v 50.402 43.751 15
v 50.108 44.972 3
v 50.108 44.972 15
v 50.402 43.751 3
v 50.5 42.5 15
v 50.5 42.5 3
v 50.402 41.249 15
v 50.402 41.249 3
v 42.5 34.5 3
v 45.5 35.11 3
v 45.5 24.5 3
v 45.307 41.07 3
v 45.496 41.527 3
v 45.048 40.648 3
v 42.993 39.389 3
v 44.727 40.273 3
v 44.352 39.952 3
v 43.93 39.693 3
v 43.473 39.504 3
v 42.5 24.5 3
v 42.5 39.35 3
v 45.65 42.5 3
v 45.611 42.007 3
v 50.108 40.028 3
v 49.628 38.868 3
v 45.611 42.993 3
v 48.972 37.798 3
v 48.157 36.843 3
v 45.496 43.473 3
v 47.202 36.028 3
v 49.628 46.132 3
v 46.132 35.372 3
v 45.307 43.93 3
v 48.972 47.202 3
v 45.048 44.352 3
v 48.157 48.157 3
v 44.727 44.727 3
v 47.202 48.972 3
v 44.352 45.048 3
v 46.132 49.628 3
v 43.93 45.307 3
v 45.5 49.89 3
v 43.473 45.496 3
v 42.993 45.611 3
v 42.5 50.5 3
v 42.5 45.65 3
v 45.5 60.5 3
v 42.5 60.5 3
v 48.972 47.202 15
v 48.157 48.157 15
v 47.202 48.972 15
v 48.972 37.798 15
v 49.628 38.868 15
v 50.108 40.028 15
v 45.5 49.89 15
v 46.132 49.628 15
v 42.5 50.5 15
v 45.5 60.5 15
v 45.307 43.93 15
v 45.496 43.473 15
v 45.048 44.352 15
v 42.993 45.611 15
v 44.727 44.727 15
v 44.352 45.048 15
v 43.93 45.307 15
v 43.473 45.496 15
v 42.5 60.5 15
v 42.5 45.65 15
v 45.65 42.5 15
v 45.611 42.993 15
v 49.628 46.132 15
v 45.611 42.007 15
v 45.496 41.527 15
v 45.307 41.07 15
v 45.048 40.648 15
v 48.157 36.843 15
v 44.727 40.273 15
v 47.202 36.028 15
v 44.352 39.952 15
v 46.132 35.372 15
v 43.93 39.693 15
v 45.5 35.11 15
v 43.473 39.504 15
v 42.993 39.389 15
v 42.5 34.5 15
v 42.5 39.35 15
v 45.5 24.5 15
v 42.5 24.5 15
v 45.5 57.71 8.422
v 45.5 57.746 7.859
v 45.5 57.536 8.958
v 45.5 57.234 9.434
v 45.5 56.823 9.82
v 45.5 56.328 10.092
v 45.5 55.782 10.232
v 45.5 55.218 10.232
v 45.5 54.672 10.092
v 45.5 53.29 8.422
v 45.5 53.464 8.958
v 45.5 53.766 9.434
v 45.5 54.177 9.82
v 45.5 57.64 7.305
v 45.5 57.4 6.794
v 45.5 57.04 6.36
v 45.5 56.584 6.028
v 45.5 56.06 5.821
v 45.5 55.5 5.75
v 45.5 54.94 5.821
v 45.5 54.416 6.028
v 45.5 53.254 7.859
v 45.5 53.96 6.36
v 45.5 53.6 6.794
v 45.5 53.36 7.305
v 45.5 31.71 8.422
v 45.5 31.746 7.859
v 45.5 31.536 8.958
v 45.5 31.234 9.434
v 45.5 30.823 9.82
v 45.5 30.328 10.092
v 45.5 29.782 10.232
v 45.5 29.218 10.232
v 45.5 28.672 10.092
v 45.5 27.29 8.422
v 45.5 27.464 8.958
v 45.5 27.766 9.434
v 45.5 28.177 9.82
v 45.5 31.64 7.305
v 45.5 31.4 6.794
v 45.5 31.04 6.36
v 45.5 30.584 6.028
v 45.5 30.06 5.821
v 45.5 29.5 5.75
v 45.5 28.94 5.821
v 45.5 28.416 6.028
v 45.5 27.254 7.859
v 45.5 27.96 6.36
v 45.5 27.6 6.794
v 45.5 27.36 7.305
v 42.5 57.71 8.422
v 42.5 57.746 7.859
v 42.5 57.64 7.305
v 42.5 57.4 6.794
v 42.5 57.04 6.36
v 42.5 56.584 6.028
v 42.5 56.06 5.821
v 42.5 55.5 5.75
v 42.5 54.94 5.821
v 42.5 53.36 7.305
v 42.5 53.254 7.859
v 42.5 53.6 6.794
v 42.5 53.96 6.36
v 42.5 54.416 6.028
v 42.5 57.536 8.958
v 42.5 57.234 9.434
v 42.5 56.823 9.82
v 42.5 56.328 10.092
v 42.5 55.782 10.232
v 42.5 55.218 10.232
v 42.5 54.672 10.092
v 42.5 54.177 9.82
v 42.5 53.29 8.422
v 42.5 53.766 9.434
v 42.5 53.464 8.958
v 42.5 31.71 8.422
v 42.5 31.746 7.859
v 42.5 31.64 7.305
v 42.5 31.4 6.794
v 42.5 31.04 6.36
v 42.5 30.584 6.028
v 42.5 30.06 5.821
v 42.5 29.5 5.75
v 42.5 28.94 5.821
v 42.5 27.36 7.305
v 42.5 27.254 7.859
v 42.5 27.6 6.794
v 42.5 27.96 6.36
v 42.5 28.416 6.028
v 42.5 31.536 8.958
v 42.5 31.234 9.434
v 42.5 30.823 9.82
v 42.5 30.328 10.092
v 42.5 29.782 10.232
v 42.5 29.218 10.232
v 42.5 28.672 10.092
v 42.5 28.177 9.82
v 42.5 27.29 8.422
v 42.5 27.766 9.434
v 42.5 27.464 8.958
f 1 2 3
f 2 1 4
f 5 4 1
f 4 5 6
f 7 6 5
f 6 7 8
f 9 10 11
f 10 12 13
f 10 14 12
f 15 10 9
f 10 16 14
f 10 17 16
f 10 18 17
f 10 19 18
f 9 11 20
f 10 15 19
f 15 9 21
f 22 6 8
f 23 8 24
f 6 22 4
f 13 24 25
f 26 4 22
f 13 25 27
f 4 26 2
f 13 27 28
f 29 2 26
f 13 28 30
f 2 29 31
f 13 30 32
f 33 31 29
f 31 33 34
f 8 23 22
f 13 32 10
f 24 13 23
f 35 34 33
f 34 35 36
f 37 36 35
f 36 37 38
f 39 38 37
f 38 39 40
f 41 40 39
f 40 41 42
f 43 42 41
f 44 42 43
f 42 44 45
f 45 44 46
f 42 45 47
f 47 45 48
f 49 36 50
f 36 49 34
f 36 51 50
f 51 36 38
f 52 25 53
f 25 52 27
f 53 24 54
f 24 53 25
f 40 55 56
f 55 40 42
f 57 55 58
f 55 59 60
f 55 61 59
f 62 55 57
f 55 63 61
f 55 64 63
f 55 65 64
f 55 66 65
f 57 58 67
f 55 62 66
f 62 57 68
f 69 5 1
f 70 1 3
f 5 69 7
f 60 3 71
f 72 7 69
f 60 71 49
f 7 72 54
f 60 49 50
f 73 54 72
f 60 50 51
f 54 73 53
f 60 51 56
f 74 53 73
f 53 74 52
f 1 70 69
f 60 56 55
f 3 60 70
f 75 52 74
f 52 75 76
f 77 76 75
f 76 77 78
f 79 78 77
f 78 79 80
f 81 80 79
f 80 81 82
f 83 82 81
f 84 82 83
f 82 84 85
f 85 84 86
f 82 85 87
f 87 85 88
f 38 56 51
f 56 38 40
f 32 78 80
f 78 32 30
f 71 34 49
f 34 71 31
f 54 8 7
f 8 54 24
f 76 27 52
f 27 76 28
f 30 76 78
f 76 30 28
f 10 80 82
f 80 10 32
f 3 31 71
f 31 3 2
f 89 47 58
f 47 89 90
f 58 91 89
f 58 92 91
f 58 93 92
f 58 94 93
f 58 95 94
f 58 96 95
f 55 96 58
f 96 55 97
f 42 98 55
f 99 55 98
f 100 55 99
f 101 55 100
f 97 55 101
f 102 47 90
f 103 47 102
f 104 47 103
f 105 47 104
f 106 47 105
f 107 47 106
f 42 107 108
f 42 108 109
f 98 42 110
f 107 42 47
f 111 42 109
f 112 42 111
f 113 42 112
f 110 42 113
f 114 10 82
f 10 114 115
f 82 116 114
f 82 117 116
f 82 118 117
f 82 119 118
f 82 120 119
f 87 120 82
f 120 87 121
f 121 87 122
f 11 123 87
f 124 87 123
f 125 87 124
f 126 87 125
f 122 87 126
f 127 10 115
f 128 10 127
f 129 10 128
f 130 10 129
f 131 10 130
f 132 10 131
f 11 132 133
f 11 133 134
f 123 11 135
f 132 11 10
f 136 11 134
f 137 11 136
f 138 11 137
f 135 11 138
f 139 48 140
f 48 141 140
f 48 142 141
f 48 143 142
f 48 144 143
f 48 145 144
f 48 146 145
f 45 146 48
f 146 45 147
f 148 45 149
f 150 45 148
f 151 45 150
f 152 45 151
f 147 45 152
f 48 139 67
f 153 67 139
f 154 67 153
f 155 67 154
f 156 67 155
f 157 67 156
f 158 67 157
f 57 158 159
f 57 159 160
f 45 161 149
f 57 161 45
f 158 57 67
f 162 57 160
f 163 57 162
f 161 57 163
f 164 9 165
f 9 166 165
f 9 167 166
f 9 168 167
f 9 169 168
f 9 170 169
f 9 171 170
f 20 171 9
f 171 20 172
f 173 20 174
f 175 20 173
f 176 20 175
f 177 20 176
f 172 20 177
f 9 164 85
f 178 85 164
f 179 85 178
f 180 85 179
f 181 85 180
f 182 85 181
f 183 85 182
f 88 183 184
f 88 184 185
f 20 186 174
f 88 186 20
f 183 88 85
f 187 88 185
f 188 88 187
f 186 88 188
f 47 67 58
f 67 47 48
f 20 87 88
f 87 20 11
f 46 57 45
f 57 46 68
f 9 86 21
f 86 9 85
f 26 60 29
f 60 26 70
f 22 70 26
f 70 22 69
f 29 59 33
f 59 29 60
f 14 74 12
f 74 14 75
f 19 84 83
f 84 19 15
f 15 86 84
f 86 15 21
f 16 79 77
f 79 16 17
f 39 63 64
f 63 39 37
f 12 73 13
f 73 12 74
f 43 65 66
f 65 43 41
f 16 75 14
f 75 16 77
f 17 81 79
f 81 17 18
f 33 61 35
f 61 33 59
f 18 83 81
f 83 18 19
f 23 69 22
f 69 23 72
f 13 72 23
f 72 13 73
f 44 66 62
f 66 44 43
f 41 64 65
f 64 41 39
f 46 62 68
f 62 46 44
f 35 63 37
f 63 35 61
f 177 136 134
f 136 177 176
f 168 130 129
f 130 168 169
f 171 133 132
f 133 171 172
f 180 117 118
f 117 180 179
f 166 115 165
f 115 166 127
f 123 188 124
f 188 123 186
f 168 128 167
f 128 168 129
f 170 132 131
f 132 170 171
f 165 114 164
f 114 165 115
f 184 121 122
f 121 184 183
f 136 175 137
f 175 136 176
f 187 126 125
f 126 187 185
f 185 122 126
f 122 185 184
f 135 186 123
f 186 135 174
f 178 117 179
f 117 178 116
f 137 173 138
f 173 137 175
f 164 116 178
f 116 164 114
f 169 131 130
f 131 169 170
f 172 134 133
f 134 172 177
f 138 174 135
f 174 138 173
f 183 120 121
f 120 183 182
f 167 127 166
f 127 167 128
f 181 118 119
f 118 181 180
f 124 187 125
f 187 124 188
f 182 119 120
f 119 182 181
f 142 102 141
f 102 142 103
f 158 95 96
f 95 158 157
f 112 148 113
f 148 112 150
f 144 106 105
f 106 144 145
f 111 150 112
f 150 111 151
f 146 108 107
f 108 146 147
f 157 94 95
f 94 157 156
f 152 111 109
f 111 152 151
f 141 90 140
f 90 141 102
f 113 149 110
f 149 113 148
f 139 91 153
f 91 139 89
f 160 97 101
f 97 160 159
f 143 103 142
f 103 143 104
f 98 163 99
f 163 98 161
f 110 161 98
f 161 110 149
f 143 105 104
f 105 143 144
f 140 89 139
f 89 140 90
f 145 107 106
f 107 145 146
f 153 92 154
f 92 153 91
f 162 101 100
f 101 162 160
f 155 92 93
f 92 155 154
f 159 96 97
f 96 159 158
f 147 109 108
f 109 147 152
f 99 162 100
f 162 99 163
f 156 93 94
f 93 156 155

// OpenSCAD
module bolt(){
    cylinder(r=2.25,h=42,$fn=20);
}

module poleConnector(){
    difference(){
        union(){
            cube([20,10,25]);
            translate([0,0,25])cube([20,8,8]);
            translate([0,11,0])cube([20,10,25]);
        }
        translate([10,10.5,0])cylinder(r=3.35,h=50,$fn=30);
        rotate([90,0,0])translate([3.5,20,-42])bolt();
        rotate([90,0,0])translate([16.5,20,-42])bolt();
        rotate([90,0,0])translate([3.5,5,-42])bolt();
        rotate([90,0,0])translate([16.5,5,-42])bolt();
        rotate([0,90,0])translate([-29,4,0])bolt();
        }
}

module cameraConnector(){
    difference(){
        union(){
            cube([26,3,30]);
            translate([0,0,22])cube([3,20,8]);
            translate([23,0,22])cube([3,20,8]);
        }
        rotate([0,90,0])translate([-26,15,0])bolt();
        rotate([90,0,0])translate([5,5,-3])bolt();
        rotate([90,0,0])translate([21,5,-3])bolt();
    }
}
module partP1(){
    //main platform
    l=85;
    difference(){
        union(){
            cube([l,l,3]);
            translate([l/2,l/2,3])cylinder(r=8,h=12,$fn=40);
            translate([l/2-3,l/2-18,3])cube([3,36,12]);
        }
        translate([l/2,l/2-8,3])cube([8,16,12]);
        translate([l/2,l/2,3])cylinder(r=6.3/2,h=12,$fn=40);
        translate([l/2-3,l/2-13,8])rotate([0,90,0])
        cylinder(r=2.25,h=3,$fn=25);
        translate([l/2-3,l/2+13,8])rotate([0,90,0])
        cylinder(r=2.25,h=3,$fn=25);
    }
}//partP1();
module partP2(){
    //platform clamp
    l=85;
    difference(){
        union(){
            translate([l/2,l/2,3])cylinder(r=8,h=12,$fn=40);
            translate([l/2,l/2-18,3])cube([3,36,12]);
        }
        translate([l/2-8,l/2-8,3])cube([8,16,12]);
        translate([l/2,l/2,3])cylinder(r=6.3/2,h=12,$fn=40);
        translate([l/2,l/2-13,8])rotate([0,90,0])
        cylinder(r=2.25,h=3,$fn=25);
        translate([l/2,l/2+13,8])rotate([0,90,0])
        cylinder(r=2.25,h=3,$fn=25);
    }
}partP2();
